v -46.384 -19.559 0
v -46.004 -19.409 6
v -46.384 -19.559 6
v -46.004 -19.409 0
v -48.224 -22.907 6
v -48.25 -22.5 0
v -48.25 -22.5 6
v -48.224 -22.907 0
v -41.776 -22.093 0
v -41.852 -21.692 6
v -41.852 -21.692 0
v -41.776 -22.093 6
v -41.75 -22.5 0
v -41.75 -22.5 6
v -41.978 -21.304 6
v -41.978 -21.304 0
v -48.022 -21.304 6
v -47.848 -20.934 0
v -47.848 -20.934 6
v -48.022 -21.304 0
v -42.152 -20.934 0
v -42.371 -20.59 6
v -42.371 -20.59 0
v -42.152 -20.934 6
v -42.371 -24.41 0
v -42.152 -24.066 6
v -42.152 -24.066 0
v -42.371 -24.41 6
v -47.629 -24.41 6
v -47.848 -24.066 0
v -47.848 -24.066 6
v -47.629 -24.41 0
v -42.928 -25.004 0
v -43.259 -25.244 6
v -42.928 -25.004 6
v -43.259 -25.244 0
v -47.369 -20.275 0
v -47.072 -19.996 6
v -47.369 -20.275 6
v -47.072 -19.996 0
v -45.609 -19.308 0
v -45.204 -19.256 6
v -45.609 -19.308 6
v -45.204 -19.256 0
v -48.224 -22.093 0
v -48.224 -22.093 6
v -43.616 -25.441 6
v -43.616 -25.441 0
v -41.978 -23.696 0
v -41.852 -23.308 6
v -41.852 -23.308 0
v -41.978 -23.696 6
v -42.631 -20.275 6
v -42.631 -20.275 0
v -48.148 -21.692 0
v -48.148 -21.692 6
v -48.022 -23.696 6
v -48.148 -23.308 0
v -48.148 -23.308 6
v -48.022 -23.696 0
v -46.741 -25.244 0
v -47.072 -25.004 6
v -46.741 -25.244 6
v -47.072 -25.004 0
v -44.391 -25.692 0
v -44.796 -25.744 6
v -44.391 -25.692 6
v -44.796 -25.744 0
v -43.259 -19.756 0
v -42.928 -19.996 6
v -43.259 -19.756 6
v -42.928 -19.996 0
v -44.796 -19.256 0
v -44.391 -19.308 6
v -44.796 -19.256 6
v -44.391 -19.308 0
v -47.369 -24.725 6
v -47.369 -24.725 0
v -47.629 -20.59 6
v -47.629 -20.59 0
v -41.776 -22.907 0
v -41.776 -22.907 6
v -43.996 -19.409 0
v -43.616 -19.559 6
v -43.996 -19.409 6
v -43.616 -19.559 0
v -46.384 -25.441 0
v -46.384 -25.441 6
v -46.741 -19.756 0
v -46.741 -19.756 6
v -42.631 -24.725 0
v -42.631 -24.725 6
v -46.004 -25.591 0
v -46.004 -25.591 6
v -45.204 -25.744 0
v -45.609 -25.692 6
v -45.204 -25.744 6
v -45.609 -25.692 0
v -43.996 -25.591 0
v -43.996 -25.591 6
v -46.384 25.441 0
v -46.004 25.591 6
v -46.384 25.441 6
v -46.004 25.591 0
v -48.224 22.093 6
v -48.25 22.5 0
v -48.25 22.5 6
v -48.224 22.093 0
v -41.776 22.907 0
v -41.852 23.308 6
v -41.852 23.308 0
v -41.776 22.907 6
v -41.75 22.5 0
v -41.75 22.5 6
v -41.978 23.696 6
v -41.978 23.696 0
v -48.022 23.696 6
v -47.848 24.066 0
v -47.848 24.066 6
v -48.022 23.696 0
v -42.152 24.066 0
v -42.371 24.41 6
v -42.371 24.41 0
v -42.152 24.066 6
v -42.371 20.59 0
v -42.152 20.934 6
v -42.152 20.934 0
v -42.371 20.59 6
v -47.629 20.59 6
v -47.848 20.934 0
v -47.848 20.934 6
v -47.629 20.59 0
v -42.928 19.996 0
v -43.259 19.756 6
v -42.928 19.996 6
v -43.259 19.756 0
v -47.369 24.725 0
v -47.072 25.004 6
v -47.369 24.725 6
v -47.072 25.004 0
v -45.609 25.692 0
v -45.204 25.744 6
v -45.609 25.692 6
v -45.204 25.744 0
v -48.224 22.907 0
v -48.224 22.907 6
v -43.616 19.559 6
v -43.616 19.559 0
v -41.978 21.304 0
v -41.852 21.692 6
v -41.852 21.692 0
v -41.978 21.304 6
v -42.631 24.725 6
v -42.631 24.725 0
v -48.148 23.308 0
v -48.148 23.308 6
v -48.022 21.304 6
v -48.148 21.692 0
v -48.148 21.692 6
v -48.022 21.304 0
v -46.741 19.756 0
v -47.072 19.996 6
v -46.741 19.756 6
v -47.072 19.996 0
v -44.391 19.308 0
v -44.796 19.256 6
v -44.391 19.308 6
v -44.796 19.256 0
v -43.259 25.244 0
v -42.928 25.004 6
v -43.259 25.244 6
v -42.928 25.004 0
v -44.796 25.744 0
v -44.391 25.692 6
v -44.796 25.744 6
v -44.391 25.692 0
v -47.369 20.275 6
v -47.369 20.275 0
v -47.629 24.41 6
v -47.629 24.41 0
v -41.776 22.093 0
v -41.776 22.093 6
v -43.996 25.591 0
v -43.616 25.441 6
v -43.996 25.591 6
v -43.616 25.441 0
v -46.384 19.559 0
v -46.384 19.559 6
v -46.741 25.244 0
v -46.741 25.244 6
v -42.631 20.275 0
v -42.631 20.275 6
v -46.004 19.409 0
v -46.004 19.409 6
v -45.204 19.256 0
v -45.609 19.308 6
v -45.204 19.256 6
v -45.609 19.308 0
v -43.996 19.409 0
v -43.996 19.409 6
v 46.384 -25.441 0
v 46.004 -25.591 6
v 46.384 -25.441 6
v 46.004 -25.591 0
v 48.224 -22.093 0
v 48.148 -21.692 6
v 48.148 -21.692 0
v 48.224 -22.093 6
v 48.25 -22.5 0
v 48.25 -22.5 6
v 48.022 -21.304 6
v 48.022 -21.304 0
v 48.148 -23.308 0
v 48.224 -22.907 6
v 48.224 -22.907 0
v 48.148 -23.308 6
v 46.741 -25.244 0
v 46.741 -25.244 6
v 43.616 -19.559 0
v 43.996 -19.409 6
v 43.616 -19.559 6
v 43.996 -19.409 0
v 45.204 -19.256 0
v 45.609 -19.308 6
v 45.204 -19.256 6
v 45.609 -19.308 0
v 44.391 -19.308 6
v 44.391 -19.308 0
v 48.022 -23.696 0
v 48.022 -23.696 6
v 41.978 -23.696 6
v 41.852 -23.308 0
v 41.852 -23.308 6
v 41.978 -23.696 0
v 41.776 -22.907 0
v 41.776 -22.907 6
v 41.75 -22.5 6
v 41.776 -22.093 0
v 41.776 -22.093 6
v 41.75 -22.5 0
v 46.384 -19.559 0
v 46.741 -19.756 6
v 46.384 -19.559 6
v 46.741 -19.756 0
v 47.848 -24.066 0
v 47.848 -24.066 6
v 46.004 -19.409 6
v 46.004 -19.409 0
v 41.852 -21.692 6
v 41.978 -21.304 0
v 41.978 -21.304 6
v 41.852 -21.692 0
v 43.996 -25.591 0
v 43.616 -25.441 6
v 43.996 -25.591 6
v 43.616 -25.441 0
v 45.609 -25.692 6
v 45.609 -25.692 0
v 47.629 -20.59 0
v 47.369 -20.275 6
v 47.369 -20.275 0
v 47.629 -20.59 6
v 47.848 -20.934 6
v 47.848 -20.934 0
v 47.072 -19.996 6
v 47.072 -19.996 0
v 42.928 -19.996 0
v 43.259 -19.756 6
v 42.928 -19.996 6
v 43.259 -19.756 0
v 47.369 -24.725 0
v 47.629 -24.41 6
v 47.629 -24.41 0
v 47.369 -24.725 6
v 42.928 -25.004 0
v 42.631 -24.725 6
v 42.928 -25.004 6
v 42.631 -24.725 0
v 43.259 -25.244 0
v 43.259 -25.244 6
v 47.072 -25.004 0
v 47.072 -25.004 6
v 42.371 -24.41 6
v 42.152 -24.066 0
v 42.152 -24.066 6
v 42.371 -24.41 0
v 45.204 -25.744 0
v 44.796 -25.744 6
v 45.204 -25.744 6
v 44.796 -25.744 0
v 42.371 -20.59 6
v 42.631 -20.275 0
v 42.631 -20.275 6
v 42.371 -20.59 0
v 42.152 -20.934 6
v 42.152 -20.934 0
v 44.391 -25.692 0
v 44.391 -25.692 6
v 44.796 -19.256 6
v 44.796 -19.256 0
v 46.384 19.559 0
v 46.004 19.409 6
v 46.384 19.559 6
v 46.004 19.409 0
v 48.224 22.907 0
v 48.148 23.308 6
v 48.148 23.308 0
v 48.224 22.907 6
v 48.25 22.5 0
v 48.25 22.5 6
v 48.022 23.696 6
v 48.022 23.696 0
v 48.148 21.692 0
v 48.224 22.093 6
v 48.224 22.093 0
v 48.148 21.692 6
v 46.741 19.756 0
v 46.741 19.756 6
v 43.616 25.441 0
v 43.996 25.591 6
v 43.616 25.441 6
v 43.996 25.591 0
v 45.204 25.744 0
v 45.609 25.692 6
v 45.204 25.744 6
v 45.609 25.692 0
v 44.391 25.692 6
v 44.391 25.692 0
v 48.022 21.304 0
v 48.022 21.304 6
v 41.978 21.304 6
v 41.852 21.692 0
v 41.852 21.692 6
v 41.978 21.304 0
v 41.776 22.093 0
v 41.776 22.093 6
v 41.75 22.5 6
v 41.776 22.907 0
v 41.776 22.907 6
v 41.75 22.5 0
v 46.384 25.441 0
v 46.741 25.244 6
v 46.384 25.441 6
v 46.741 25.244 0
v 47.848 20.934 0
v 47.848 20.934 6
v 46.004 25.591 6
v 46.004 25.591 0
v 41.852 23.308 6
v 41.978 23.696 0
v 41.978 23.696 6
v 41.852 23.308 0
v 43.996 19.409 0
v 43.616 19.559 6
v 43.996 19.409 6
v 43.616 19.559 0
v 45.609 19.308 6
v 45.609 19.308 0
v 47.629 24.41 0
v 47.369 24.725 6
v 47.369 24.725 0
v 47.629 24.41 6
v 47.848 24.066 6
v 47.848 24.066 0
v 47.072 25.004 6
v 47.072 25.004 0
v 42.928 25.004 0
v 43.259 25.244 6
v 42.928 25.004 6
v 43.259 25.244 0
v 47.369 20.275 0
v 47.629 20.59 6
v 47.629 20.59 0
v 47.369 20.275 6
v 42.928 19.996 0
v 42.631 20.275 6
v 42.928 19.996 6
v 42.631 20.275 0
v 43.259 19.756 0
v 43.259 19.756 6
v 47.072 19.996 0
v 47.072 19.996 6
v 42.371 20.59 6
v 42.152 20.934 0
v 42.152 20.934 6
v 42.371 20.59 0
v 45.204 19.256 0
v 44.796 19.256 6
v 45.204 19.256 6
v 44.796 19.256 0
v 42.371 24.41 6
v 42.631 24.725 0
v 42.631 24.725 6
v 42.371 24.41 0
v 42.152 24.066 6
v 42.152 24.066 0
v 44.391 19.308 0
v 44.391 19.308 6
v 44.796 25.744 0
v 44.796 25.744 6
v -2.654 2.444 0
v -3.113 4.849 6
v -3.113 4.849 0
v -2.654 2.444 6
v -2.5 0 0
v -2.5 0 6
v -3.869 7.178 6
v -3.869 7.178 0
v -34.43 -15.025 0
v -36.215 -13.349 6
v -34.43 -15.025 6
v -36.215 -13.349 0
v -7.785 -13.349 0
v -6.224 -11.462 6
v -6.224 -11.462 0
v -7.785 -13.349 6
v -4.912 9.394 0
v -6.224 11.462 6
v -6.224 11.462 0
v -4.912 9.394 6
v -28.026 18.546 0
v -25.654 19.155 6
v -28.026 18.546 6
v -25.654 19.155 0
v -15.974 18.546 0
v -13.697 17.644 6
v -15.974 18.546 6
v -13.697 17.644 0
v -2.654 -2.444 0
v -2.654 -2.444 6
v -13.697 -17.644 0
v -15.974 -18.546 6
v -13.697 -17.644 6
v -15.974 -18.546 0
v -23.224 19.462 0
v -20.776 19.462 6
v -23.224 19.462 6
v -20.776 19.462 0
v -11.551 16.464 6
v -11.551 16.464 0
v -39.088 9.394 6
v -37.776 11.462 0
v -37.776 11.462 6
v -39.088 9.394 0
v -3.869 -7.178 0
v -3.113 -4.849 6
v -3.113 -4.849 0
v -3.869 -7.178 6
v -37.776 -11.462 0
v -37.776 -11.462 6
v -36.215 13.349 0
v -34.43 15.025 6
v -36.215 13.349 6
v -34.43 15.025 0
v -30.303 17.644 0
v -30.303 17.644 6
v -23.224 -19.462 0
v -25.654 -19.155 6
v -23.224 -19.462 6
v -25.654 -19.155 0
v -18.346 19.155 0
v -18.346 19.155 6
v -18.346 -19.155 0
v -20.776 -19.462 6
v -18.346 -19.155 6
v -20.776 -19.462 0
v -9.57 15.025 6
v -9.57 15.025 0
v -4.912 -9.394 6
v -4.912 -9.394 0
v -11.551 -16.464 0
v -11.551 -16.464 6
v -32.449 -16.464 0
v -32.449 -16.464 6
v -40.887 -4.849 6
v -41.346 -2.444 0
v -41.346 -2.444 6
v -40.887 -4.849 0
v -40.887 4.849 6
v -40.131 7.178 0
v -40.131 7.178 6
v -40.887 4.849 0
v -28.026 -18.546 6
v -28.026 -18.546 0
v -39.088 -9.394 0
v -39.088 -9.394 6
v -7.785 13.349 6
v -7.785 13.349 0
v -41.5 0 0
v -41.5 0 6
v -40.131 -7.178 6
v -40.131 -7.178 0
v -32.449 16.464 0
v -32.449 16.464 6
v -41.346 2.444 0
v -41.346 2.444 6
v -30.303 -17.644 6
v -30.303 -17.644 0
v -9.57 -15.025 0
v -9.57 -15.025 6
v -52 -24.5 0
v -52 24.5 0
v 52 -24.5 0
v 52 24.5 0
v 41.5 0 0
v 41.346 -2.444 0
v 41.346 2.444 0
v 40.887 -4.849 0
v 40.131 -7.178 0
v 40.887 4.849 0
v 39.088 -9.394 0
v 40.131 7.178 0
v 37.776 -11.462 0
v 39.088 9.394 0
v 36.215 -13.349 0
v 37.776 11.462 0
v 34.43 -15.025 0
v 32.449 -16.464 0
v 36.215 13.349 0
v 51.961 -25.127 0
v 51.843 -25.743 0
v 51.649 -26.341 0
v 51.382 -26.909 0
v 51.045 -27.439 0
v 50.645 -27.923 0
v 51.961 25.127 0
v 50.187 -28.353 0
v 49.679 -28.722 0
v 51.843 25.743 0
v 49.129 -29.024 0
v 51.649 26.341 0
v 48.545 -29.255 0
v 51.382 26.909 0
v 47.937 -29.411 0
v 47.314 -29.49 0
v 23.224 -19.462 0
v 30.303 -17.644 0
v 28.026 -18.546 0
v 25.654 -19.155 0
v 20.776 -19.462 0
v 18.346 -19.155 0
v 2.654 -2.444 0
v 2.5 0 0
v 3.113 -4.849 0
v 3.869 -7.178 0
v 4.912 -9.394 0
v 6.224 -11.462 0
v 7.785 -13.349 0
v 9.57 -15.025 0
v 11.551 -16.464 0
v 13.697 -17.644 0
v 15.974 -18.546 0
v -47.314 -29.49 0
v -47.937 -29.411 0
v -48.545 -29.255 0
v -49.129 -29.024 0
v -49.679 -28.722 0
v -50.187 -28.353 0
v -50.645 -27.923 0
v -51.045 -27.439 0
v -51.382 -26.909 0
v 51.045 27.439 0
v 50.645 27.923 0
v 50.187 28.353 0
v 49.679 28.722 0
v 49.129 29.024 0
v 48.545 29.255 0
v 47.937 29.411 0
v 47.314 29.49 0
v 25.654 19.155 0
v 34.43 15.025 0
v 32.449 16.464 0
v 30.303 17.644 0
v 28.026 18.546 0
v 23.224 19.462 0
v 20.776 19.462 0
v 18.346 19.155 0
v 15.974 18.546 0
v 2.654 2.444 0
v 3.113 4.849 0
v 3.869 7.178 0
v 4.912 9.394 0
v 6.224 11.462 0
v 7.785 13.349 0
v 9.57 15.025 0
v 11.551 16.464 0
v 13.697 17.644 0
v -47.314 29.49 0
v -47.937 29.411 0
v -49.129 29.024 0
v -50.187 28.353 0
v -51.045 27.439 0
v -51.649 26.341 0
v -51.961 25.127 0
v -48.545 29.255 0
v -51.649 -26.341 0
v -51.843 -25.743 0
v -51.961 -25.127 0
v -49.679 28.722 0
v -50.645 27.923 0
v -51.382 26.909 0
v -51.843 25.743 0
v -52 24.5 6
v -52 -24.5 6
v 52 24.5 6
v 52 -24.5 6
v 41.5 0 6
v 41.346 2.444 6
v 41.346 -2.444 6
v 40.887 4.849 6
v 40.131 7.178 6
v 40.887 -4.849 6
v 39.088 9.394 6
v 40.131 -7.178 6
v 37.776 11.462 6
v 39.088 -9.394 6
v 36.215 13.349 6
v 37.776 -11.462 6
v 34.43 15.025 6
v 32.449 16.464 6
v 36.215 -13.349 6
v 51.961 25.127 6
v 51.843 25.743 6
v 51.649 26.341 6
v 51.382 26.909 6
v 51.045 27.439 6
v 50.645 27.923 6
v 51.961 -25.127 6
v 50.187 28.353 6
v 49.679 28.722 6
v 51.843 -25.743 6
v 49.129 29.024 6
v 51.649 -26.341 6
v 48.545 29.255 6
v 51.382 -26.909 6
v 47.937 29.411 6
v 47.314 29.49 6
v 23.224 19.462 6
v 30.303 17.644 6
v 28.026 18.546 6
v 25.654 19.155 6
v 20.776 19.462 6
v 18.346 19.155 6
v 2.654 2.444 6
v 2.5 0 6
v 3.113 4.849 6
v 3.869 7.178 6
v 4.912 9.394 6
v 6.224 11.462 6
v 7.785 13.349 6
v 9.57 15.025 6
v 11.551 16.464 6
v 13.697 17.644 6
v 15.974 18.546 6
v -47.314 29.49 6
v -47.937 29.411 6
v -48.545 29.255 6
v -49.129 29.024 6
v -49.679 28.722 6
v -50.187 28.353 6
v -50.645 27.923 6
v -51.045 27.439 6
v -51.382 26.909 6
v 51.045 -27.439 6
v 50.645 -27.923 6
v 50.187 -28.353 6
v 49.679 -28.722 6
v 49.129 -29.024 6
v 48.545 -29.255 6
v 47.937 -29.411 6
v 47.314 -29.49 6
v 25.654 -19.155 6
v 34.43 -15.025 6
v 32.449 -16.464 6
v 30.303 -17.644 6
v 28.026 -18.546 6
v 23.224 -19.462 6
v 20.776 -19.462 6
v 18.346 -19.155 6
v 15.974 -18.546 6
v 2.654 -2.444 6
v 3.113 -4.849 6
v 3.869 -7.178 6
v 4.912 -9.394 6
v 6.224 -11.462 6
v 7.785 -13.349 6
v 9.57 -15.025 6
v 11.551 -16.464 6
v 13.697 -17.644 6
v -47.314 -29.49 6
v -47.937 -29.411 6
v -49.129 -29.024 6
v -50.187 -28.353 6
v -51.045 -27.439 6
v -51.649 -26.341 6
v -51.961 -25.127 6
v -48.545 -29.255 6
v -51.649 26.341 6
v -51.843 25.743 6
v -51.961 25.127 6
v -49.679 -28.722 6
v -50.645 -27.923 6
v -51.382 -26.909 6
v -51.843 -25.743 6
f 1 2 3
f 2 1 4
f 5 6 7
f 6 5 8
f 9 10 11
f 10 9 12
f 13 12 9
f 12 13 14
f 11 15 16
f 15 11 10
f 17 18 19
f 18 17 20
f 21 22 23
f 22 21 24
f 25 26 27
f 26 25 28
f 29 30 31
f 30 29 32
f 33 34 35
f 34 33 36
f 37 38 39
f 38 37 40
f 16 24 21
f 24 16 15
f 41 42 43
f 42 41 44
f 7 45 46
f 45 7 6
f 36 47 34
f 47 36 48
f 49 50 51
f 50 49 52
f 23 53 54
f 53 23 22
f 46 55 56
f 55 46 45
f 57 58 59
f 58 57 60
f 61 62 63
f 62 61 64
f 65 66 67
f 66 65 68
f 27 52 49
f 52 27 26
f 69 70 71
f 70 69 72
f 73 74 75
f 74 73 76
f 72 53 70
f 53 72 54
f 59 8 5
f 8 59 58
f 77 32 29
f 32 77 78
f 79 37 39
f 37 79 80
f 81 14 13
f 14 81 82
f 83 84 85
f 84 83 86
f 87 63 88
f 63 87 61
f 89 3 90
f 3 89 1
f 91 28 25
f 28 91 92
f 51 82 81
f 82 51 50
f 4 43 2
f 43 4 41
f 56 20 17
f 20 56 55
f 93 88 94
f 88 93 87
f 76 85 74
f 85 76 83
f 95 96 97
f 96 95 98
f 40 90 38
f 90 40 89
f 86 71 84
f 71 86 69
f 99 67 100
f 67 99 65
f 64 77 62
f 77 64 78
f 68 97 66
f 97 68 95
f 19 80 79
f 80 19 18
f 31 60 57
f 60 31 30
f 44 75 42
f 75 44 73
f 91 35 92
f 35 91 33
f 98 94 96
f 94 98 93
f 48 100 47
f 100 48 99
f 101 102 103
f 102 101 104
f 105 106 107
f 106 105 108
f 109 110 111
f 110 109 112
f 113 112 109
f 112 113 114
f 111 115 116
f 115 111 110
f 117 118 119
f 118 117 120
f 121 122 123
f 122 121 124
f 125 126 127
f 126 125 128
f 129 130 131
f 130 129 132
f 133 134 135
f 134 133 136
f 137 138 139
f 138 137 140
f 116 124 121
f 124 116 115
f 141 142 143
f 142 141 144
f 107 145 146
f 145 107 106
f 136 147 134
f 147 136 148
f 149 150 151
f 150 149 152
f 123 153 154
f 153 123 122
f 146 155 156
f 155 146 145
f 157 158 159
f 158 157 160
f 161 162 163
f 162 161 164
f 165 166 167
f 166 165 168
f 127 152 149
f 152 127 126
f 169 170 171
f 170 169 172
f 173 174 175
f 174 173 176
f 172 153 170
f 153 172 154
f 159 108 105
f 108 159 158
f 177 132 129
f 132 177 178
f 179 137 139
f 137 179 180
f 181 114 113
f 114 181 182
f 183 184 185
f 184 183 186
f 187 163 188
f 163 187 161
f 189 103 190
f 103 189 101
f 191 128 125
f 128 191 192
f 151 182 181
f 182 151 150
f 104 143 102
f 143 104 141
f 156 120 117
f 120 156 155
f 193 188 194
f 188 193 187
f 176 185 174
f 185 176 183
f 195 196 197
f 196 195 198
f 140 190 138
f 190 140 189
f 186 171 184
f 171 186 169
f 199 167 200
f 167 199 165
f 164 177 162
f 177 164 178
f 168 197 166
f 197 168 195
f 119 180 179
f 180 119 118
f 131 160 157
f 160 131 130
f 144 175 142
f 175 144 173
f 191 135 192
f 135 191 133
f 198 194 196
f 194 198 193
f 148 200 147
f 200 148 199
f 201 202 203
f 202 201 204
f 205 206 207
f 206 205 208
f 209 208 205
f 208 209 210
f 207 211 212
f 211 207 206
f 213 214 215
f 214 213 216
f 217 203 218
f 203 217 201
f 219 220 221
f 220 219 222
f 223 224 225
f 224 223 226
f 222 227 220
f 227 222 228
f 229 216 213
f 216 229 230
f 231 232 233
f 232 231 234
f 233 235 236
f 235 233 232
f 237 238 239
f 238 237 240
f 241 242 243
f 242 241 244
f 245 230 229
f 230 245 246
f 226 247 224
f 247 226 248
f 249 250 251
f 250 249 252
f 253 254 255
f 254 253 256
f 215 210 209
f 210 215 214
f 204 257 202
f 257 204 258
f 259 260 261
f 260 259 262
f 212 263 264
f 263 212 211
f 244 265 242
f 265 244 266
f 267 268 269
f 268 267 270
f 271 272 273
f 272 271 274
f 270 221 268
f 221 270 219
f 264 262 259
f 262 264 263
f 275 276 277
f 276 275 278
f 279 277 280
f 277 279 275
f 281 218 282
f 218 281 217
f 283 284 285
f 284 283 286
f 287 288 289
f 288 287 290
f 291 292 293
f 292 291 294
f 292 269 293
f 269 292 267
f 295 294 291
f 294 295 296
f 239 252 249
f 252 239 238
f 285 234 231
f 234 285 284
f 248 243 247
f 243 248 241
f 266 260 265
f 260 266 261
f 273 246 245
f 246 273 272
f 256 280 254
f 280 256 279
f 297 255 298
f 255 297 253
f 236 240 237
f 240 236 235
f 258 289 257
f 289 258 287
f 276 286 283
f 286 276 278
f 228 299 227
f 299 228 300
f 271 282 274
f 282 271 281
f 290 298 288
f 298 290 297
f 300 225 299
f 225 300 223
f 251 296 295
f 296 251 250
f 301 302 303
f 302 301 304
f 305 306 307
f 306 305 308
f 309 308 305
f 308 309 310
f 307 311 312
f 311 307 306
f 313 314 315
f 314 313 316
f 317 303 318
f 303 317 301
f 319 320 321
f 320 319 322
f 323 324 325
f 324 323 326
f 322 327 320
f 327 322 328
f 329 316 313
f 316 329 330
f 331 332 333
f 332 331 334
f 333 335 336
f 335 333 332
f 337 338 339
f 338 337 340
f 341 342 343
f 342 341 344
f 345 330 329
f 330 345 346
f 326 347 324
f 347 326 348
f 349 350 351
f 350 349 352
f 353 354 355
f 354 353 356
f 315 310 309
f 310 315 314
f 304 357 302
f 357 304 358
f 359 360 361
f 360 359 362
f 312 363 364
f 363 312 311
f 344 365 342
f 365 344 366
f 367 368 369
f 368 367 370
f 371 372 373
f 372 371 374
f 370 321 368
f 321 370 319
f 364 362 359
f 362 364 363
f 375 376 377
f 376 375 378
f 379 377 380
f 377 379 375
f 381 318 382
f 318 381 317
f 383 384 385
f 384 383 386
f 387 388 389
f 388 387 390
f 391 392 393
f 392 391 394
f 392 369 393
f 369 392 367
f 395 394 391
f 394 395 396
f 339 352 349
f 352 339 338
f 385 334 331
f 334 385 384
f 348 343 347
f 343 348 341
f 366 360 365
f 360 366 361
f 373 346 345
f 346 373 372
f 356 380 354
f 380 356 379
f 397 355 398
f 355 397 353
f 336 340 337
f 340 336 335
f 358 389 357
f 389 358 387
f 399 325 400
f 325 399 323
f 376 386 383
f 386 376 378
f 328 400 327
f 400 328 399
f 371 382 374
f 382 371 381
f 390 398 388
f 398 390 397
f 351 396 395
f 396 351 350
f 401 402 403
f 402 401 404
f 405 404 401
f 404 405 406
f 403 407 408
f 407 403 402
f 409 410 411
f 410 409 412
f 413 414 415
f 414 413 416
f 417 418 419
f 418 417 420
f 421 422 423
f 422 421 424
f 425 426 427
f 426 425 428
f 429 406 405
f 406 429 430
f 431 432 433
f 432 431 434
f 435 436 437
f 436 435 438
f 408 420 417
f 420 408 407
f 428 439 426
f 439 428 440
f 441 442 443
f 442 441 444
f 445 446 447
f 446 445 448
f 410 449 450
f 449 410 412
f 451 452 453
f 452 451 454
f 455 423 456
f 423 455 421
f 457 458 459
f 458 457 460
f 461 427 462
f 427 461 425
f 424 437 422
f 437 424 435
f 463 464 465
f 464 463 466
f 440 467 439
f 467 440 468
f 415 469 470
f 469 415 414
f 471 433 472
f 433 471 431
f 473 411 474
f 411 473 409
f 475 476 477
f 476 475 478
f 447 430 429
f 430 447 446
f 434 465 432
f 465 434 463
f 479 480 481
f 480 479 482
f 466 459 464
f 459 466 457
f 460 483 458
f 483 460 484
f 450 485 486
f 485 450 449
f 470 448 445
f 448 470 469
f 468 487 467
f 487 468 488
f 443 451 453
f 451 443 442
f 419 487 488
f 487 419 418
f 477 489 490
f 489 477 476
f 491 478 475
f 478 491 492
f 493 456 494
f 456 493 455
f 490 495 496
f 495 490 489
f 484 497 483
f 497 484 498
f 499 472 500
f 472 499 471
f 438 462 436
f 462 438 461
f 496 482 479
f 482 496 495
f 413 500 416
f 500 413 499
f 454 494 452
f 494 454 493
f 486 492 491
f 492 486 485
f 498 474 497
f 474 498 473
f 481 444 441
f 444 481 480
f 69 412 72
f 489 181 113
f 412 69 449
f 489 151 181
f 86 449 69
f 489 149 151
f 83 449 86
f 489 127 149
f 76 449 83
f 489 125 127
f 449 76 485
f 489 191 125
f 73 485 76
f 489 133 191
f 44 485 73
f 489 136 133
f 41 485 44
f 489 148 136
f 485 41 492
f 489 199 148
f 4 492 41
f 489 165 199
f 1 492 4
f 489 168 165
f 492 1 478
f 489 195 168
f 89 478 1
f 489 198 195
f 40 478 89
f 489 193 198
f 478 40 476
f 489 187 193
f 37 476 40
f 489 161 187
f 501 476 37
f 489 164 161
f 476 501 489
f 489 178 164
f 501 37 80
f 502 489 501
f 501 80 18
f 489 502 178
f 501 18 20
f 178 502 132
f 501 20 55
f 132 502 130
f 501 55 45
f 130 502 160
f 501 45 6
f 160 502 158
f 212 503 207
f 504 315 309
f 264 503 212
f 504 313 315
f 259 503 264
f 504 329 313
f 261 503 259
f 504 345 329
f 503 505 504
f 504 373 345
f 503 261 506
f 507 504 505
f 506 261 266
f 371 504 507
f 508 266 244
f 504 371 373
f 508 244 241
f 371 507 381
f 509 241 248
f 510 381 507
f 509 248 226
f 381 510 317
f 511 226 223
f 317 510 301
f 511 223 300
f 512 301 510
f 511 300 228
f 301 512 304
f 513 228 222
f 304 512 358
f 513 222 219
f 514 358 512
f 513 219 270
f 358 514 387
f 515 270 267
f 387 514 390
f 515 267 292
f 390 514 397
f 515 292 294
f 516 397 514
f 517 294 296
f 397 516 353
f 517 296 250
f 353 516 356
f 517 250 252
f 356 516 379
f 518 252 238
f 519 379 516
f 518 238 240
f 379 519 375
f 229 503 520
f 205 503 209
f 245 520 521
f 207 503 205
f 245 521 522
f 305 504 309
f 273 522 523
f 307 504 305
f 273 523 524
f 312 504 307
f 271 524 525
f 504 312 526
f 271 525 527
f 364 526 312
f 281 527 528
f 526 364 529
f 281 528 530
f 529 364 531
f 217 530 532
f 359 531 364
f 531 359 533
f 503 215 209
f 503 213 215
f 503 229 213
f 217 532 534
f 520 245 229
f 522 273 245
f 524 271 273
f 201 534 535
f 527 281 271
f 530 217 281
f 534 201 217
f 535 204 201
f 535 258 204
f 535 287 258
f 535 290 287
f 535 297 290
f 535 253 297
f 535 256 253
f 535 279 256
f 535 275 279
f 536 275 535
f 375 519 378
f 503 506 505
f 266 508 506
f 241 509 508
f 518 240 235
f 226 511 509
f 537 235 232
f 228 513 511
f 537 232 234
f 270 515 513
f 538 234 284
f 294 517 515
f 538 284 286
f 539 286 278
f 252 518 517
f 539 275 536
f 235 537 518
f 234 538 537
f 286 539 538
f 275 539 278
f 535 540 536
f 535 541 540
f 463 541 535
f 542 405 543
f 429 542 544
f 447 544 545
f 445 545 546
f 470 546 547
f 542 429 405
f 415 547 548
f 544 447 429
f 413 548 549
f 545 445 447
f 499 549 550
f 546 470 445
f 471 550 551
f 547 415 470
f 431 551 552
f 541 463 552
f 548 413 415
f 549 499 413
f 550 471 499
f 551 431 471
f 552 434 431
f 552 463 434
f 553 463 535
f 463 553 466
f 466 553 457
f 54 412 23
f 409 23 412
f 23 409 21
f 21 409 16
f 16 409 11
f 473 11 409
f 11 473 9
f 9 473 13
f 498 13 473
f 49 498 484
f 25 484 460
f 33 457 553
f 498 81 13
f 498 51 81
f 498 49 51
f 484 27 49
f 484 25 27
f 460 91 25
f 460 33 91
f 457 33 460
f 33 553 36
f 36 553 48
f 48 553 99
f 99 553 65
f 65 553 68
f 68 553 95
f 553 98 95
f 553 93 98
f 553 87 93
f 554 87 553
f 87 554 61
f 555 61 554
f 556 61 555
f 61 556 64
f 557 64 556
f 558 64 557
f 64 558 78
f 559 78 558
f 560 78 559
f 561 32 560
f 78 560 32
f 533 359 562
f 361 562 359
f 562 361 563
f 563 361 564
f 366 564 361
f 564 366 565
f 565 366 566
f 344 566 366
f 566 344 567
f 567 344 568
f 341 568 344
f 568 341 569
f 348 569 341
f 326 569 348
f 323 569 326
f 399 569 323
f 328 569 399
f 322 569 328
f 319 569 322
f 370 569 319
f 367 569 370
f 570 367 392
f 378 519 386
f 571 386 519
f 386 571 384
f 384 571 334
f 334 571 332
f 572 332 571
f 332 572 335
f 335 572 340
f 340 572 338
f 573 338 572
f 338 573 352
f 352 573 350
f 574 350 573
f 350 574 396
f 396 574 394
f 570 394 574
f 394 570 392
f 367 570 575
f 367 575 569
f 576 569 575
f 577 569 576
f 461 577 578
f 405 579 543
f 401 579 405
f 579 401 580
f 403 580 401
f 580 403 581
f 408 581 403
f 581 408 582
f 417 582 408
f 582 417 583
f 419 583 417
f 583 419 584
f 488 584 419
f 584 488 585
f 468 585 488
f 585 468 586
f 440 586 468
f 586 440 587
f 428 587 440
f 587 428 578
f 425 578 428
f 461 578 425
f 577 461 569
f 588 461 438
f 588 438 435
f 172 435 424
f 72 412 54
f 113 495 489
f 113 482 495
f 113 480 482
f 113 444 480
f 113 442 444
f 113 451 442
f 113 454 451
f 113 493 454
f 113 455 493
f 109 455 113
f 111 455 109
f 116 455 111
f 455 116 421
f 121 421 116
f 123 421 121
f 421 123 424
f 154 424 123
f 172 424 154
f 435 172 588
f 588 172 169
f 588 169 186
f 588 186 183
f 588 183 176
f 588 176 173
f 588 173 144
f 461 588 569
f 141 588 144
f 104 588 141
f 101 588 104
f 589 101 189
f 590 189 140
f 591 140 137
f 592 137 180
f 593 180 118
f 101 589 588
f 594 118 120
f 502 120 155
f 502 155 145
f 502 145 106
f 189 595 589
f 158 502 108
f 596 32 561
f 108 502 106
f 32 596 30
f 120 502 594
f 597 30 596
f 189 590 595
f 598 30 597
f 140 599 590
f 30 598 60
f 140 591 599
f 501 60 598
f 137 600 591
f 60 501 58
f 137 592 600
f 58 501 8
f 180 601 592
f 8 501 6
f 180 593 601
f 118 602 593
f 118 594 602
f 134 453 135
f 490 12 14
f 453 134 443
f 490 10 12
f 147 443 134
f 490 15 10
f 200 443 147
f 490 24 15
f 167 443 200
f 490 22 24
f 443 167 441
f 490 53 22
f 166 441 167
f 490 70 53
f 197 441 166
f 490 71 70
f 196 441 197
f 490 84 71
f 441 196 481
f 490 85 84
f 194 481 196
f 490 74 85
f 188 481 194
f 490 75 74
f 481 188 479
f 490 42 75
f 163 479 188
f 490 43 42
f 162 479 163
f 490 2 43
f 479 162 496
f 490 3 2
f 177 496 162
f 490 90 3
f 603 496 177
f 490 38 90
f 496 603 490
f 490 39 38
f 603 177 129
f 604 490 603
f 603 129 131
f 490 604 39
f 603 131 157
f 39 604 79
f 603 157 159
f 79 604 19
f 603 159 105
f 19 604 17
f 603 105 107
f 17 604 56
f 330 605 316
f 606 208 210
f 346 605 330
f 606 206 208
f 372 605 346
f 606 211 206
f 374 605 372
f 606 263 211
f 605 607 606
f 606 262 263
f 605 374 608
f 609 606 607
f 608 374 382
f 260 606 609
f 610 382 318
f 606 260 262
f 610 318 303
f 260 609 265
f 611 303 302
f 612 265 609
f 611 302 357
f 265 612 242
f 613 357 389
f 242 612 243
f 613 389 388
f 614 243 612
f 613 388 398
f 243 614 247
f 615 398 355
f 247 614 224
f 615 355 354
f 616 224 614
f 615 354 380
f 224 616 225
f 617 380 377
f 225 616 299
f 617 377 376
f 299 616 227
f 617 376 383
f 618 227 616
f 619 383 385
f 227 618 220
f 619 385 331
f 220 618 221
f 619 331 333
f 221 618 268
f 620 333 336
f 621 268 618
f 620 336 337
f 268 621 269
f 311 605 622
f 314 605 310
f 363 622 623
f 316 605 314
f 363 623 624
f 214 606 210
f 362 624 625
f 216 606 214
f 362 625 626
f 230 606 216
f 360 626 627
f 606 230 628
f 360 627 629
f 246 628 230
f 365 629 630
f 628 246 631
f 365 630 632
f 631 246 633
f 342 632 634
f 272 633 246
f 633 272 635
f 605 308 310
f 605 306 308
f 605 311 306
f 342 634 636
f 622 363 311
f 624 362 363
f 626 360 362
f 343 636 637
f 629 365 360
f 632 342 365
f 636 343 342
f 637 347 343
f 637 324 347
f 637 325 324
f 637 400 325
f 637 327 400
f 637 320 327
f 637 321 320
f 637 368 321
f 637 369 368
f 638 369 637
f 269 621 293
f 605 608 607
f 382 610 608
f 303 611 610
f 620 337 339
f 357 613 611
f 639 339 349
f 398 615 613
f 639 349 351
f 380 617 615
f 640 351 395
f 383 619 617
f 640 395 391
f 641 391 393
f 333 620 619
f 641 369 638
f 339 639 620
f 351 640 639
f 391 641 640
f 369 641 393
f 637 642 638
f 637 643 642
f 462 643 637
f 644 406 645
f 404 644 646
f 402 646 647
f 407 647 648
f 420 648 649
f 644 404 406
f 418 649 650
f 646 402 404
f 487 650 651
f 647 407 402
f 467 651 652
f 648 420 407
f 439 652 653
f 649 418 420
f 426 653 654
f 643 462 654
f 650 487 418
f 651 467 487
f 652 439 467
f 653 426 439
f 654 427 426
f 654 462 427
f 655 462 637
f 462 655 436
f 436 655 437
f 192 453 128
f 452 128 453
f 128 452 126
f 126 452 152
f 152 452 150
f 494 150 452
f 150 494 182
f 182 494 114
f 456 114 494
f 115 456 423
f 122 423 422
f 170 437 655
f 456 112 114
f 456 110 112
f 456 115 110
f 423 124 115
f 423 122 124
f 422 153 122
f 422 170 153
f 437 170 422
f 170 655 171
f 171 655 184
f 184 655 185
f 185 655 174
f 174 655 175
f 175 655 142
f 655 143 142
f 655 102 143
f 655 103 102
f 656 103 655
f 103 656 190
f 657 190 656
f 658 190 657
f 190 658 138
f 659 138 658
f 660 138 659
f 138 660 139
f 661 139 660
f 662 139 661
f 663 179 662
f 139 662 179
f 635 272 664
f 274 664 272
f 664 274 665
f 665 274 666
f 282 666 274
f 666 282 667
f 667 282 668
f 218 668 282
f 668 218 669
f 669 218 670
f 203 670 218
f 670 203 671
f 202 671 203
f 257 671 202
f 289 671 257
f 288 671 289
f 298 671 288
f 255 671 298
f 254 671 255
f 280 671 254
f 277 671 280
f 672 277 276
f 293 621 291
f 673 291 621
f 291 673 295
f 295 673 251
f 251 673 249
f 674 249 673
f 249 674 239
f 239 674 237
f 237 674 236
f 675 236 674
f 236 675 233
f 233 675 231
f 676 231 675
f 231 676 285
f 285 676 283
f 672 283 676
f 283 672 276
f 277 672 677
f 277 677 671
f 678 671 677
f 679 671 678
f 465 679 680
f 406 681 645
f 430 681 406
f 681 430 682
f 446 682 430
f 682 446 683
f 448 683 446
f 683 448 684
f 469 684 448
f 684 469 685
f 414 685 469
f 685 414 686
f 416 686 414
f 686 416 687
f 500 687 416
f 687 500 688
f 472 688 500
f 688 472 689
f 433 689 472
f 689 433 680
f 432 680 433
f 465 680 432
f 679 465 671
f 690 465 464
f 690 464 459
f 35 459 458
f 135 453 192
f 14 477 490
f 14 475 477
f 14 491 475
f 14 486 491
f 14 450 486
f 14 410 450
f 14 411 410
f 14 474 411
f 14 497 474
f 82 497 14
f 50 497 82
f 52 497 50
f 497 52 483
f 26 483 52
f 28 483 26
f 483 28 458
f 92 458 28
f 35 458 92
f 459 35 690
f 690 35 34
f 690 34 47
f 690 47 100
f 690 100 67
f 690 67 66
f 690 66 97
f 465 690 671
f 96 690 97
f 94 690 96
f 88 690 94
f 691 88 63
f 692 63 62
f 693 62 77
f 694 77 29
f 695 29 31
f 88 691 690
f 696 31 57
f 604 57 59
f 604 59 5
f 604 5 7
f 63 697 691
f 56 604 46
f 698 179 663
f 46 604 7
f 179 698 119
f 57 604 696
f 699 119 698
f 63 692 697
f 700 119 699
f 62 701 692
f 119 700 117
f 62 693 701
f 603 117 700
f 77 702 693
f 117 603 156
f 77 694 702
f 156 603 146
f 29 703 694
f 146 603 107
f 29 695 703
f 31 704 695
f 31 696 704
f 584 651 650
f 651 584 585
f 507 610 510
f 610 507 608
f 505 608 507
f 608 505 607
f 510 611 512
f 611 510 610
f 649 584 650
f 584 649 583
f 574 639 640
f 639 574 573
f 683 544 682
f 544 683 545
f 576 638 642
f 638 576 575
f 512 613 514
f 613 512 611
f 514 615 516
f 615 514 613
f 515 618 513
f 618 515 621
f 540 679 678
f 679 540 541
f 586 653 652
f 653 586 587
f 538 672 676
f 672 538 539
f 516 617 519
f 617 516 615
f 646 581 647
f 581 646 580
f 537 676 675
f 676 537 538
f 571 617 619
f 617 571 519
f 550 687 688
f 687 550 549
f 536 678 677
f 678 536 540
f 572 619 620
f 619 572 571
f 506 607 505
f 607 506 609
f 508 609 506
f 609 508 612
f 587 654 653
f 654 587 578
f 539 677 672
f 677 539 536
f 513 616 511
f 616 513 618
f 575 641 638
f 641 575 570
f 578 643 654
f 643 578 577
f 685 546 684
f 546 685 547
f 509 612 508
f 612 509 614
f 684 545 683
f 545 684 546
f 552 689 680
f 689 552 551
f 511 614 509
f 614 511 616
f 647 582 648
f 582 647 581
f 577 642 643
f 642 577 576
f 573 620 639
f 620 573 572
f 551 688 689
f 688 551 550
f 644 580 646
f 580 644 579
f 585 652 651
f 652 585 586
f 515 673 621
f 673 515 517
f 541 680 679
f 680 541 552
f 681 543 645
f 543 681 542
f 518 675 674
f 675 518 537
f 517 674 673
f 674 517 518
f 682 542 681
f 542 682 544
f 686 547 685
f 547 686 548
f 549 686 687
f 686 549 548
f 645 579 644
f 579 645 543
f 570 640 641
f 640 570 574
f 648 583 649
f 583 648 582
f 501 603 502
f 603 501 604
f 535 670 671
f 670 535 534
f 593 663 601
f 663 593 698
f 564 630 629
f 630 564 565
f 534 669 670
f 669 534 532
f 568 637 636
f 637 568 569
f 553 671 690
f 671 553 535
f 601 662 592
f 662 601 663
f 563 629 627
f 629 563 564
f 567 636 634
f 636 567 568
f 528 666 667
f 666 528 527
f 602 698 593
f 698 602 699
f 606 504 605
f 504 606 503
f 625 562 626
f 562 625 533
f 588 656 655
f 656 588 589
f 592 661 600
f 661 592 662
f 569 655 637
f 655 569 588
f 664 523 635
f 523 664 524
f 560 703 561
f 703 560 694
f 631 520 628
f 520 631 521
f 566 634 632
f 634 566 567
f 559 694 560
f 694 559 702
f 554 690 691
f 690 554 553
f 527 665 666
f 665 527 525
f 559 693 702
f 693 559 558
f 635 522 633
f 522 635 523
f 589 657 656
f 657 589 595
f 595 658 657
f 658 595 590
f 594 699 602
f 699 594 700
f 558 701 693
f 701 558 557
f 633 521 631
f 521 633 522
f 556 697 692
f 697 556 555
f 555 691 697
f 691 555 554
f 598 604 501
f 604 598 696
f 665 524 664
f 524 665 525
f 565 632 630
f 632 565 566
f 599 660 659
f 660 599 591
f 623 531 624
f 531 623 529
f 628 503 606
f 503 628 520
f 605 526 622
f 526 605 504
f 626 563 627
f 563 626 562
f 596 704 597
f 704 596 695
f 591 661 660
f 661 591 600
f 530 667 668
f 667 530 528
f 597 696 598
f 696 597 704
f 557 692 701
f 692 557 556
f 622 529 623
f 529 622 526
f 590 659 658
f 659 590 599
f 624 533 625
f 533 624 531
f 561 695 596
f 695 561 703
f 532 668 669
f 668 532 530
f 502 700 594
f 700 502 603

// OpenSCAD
$fn = 50;


difference() {
	union() {
		hull() {
			translate(v = [-47.0000000000, 24.5000000000, 0]) {
				cylinder(h = 6, r = 5);
			}
			translate(v = [47.0000000000, 24.5000000000, 0]) {
				cylinder(h = 6, r = 5);
			}
			translate(v = [-47.0000000000, -24.5000000000, 0]) {
				cylinder(h = 6, r = 5);
			}
			translate(v = [47.0000000000, -24.5000000000, 0]) {
				cylinder(h = 6, r = 5);
			}
		}
	}
	union() {
		#translate(v = [-45.0000000000, -22.5000000000, -100.0000000000]) {
			cylinder(h = 200, r = 3.2500000000);
		}
		#translate(v = [-45.0000000000, 22.5000000000, -100.0000000000]) {
			cylinder(h = 200, r = 3.2500000000);
		}
		#translate(v = [45.0000000000, -22.5000000000, -100.0000000000]) {
			cylinder(h = 200, r = 3.2500000000);
		}
		#translate(v = [45.0000000000, 22.5000000000, -100.0000000000]) {
			cylinder(h = 200, r = 3.2500000000);
		}
		#translate(v = [-22.0000000000, 0, 0]) {
			cylinder(h = 6, r = 19.5000000000);
		}
		#translate(v = [22.0000000000, 0, 0]) {
			cylinder(h = 6, r = 19.5000000000);
		}
	}
}
